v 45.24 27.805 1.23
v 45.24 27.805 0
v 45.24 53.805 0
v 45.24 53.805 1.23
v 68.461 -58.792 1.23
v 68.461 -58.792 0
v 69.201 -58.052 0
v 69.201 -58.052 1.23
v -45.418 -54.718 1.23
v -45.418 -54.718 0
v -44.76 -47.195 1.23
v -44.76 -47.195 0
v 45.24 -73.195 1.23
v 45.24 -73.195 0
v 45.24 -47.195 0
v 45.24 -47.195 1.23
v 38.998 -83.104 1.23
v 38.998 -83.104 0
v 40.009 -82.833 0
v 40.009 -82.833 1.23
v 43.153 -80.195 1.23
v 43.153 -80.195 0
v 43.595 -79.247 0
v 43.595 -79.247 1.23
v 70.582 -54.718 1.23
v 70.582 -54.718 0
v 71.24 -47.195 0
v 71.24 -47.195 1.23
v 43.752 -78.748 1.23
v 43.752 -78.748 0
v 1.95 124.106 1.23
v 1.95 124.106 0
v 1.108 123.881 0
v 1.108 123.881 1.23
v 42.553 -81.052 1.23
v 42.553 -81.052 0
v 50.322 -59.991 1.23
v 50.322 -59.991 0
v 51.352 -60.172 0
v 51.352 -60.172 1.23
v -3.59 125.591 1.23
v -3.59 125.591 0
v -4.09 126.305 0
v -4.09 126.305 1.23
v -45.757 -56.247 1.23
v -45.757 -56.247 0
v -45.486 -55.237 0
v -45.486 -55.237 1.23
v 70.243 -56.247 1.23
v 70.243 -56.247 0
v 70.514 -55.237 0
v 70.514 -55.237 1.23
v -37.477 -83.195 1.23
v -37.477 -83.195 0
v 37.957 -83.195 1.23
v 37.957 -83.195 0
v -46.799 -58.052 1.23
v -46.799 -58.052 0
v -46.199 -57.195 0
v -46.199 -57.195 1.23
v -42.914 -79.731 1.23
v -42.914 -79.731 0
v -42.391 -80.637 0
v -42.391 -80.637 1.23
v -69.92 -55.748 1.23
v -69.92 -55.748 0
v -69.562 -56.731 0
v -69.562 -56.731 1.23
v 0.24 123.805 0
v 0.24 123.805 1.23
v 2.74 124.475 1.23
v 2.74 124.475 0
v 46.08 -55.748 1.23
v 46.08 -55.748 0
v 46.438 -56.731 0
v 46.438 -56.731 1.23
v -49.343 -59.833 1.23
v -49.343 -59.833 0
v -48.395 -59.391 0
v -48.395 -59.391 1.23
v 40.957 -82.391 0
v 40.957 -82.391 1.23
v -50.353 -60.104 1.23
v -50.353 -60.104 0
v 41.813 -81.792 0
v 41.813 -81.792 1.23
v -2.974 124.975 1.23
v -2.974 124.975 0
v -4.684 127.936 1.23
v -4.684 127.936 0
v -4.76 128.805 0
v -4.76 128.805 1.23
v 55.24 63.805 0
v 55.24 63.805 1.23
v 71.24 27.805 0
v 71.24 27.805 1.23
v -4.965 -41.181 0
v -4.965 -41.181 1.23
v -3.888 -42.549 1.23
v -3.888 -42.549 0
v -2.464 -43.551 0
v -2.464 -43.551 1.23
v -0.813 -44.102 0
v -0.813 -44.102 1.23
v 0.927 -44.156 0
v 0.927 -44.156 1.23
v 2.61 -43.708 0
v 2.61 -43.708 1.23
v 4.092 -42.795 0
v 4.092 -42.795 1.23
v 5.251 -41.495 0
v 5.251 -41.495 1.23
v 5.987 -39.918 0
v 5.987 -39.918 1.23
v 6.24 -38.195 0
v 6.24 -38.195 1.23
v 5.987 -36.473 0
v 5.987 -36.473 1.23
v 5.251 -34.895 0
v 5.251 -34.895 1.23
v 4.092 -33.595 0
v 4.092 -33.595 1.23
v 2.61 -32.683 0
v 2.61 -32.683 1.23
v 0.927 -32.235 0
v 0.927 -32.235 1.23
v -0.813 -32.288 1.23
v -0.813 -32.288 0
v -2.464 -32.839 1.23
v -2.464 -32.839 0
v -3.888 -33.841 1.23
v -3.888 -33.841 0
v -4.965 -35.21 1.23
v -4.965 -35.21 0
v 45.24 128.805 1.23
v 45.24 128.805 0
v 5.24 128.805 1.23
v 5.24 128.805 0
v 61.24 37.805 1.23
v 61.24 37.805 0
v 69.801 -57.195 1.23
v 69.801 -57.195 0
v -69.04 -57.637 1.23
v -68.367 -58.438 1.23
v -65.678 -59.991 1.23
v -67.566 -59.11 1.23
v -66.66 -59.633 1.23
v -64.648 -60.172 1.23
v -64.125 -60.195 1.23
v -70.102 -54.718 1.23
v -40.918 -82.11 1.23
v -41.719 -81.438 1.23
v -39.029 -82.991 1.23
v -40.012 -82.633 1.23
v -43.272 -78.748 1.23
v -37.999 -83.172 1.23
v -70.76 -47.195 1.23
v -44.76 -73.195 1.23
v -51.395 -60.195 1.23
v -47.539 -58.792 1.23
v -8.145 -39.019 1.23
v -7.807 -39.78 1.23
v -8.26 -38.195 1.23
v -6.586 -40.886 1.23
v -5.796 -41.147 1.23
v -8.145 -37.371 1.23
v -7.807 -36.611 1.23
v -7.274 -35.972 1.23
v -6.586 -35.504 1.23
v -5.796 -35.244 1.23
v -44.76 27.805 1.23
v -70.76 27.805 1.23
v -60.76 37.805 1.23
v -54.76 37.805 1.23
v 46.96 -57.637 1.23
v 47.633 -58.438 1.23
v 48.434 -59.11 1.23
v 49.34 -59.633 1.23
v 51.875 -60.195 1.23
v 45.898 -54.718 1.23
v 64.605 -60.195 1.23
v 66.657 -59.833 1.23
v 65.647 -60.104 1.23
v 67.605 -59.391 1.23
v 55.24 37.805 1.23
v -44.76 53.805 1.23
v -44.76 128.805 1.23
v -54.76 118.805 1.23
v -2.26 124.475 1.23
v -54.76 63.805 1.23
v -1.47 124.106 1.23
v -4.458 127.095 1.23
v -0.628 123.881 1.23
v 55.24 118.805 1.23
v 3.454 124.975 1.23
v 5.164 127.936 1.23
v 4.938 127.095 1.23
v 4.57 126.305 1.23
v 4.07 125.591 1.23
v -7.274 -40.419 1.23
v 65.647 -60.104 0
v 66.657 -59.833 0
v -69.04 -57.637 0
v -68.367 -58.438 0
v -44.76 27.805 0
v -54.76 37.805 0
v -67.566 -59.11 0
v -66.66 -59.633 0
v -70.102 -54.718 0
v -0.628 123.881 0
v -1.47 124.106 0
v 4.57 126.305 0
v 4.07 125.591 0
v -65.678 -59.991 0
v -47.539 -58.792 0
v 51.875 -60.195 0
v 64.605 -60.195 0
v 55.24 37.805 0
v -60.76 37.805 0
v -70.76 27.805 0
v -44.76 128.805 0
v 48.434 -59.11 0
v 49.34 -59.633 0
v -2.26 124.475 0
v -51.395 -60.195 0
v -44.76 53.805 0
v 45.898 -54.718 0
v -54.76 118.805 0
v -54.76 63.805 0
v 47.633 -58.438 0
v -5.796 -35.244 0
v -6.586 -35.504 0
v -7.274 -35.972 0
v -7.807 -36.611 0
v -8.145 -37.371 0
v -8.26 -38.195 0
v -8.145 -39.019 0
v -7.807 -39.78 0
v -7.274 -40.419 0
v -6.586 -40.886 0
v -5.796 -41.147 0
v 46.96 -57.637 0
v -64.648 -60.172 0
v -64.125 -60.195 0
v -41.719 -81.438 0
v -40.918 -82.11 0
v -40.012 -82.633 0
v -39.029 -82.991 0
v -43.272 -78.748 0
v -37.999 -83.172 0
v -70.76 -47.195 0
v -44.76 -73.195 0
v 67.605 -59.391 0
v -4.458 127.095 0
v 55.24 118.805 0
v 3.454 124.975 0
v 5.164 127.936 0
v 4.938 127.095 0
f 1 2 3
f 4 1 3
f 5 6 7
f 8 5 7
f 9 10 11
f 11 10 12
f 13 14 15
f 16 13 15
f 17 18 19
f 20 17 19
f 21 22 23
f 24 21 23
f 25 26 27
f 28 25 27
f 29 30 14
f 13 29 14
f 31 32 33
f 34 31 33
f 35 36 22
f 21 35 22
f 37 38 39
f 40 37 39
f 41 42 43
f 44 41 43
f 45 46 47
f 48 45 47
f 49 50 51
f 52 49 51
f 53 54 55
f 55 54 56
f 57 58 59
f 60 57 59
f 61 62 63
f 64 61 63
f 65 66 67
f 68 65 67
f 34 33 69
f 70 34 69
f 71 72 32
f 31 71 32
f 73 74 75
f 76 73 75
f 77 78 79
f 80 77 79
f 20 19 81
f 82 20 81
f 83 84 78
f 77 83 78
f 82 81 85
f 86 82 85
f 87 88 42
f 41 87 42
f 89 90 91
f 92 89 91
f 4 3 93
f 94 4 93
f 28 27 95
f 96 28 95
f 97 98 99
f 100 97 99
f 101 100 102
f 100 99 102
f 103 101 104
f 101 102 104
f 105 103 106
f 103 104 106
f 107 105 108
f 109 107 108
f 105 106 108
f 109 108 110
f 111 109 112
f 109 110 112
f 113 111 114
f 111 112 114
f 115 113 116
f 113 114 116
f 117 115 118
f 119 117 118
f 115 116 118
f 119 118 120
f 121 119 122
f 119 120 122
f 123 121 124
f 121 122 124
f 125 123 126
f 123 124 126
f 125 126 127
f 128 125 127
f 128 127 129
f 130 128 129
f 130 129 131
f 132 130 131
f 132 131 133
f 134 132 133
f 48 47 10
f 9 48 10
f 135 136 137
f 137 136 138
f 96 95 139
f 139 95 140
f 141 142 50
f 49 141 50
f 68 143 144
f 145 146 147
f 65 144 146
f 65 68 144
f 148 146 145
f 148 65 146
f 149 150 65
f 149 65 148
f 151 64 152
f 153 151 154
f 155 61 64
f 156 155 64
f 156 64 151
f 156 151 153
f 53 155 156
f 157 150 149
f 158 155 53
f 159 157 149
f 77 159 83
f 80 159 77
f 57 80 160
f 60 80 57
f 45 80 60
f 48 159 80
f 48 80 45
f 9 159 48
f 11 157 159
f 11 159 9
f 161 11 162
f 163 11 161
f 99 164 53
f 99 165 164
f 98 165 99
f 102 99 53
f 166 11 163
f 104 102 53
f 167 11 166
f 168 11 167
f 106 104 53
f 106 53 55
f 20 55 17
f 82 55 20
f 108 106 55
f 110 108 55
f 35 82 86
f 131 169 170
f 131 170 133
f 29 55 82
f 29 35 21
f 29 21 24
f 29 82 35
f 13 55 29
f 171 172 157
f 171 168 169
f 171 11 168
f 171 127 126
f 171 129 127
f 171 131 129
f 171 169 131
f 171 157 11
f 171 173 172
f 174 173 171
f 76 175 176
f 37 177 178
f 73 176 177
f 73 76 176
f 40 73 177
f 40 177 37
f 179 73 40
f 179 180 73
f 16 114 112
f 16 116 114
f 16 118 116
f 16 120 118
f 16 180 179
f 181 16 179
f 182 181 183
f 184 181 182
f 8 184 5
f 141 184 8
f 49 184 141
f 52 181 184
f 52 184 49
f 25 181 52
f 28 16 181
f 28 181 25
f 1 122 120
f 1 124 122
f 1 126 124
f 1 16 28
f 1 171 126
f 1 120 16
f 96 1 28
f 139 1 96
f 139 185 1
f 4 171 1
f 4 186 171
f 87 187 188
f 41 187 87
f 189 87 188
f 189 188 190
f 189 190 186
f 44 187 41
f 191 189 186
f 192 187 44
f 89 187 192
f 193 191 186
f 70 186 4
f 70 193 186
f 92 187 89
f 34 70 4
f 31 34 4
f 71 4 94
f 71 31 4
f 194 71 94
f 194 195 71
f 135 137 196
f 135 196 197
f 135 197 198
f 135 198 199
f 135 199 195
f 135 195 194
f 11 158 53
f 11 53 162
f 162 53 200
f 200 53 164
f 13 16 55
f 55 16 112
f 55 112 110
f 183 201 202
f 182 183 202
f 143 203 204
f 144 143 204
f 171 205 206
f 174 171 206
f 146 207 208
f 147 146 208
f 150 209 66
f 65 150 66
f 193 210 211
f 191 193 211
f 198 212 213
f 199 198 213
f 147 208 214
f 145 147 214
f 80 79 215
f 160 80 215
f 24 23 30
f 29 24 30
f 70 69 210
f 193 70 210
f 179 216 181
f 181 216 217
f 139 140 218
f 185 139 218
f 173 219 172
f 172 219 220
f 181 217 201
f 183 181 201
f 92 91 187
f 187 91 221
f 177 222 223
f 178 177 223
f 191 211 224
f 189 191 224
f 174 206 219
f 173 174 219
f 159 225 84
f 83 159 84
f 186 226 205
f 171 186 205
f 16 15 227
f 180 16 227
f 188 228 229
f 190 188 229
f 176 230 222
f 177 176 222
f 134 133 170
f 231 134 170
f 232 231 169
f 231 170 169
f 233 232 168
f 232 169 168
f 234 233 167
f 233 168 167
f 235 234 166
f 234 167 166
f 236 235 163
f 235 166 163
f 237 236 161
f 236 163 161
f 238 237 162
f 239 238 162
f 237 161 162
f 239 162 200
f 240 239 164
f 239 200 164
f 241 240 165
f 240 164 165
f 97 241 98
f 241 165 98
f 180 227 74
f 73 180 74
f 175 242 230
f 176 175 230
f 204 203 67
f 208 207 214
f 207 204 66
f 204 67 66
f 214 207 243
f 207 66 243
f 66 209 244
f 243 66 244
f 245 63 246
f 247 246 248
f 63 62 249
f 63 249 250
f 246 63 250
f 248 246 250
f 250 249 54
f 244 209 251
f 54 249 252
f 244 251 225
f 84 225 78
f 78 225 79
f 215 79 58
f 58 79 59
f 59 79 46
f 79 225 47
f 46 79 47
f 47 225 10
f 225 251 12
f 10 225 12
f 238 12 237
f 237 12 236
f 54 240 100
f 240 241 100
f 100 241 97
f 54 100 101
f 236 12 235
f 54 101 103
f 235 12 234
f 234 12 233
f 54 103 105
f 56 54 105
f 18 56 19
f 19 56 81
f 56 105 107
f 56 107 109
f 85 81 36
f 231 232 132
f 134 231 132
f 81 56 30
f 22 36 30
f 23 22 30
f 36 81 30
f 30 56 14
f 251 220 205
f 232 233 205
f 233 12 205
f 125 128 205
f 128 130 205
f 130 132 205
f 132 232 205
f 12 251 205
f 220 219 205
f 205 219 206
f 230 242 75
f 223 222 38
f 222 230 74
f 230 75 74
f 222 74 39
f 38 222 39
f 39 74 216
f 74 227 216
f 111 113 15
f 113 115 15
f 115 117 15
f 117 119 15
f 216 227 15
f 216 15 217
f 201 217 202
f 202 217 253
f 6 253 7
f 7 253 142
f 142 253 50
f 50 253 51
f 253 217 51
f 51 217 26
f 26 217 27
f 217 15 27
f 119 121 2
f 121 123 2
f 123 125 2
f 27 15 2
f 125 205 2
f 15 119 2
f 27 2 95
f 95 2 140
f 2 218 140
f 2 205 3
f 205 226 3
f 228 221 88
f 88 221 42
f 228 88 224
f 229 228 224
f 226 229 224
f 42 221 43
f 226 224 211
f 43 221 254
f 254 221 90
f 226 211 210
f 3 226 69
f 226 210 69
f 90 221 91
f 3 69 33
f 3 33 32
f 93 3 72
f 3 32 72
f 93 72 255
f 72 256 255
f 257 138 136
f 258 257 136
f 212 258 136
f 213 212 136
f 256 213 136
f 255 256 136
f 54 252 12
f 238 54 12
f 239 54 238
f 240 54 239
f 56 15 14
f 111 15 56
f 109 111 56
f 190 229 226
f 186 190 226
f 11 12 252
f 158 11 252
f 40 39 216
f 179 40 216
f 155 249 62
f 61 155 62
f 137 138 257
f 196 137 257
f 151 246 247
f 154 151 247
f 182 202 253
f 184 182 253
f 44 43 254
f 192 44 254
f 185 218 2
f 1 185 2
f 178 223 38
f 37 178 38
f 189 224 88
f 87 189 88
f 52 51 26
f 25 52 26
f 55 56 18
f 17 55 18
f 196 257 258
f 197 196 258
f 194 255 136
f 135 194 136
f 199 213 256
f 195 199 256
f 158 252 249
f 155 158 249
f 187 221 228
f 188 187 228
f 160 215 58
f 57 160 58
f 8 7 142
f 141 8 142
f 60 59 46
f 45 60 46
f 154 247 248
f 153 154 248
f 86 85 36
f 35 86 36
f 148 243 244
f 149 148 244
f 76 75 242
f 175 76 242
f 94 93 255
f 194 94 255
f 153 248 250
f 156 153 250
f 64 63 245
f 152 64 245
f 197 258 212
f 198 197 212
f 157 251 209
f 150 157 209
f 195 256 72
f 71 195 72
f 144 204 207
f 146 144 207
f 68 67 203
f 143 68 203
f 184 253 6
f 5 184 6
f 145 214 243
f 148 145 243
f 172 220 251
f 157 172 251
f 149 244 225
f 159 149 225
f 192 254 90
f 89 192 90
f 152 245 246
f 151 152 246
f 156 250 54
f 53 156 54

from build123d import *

# Parameters (mm, degrees)
F1_DEPTH = 1.23
F3_DEPTH = 1.231


with BuildPart() as f1:
    # F0 (on Top) → F1 (new body)
    with BuildSketch(Plane.XY):
        Polygon((-70.759976, 27.804737), (-70.759976, -47.195263), (-70.101805, -54.718197), (-69.920191, -55.748177), (-69.562483, -56.730973), (-69.039549, -57.636722), (-68.367277, -58.437904), (-67.566095, -59.110175), (-66.660346, -59.63311), (-65.677551, -59.990818), (-64.647571, -60.172431), (-64.124636, -60.195263), (-51.395316, -60.195263), (-50.353427, -60.10411), (-49.343195, -59.833419), (-48.395316, -59.391415), (-47.53859, -58.79153), (-46.799049, -58.051989), (-46.199163, -57.195263), (-45.75716, -56.247384), (-45.486469, -55.237152), (-45.418147, -54.718197), (-44.759976, -47.195263), (-44.759976, -73.195263), (-43.272077, -78.748177), (-42.914369, -79.730973), (-42.391434, -80.636722), (-41.719163, -81.437904), (-40.917981, -82.110175), (-40.012232, -82.63311), (-39.029436, -82.990818), (-37.999457, -83.172431), (-37.476522, -83.195263), (37.95657, -83.195263), (38.998459, -83.10411), (40.008691, -82.833419), (40.95657, -82.391415), (41.813296, -81.79153), (42.552837, -81.051989), (43.152723, -80.195263), (43.594726, -79.247384), (43.752125, -78.748177), (45.240024, -73.195263), (45.240024, -47.195263), (45.898195, -54.718197), (46.079809, -55.748177), (46.437517, -56.730973), (46.960451, -57.636722), (47.632723, -58.437904), (48.433905, -59.110175), (49.339654, -59.63311), (50.322449, -59.990818), (51.352429, -60.172431), (51.875364, -60.195263), (64.604684, -60.195263), (65.646573, -60.10411), (66.656805, -59.833419), (67.604684, -59.391415), (68.46141, -58.79153), (69.200951, -58.051989), (69.800837, -57.195263), (70.24284, -56.247384), (70.513531, -55.237152), (70.581853, -54.718197), (71.240024, -47.195263), (71.240024, 27.804737), (61.240024, 37.804737), (55.240024, 37.804737), (45.240024, 27.804737), (45.240024, 53.804737), (55.240024, 63.804737), (55.240024, 118.804737), (45.240024, 128.804737), (5.240024, 128.804737), (5.164063, 127.936496), (4.938487, 127.094636), (4.570151, 126.304737), (4.070246, 125.590799), (3.453962, 124.974515), (2.740024, 124.47461), (1.950125, 124.106274), (1.108265, 123.880698), (0.240024, 123.804737), (-0.628217, 123.880698), (-1.470077, 124.106274), (-2.259976, 124.47461), (-2.973914, 124.974515), (-3.590198, 125.590799), (-4.090103, 126.304737), (-4.458439, 127.094636), (-4.684015, 127.936496), (-4.759976, 128.804737), (-44.759976, 128.804737), (-54.759976, 118.804737), (-54.759976, 63.804737), (-44.759976, 53.804737), (-44.759976, 27.804737), (-54.759976, 37.804737), (-60.759976, 37.804737), align=None)
    extrude(amount=F1_DEPTH)

    # F2 (on face) → F3 (cut, through all)
    with BuildSketch(Plane.XY.offset(1.23)):
        with BuildLine():
            ThreePointArc((-4.964521, -35.209847), (-8.259976, -38.195263), (-4.964521, -41.180679))
            ThreePointArc((-4.964521, -41.180679), (6.240024, -38.195263), (-4.964521, -35.209847))
        make_face()
    extrude(amount=-F3_DEPTH, mode=Mode.SUBTRACT)


solid = f1.part
